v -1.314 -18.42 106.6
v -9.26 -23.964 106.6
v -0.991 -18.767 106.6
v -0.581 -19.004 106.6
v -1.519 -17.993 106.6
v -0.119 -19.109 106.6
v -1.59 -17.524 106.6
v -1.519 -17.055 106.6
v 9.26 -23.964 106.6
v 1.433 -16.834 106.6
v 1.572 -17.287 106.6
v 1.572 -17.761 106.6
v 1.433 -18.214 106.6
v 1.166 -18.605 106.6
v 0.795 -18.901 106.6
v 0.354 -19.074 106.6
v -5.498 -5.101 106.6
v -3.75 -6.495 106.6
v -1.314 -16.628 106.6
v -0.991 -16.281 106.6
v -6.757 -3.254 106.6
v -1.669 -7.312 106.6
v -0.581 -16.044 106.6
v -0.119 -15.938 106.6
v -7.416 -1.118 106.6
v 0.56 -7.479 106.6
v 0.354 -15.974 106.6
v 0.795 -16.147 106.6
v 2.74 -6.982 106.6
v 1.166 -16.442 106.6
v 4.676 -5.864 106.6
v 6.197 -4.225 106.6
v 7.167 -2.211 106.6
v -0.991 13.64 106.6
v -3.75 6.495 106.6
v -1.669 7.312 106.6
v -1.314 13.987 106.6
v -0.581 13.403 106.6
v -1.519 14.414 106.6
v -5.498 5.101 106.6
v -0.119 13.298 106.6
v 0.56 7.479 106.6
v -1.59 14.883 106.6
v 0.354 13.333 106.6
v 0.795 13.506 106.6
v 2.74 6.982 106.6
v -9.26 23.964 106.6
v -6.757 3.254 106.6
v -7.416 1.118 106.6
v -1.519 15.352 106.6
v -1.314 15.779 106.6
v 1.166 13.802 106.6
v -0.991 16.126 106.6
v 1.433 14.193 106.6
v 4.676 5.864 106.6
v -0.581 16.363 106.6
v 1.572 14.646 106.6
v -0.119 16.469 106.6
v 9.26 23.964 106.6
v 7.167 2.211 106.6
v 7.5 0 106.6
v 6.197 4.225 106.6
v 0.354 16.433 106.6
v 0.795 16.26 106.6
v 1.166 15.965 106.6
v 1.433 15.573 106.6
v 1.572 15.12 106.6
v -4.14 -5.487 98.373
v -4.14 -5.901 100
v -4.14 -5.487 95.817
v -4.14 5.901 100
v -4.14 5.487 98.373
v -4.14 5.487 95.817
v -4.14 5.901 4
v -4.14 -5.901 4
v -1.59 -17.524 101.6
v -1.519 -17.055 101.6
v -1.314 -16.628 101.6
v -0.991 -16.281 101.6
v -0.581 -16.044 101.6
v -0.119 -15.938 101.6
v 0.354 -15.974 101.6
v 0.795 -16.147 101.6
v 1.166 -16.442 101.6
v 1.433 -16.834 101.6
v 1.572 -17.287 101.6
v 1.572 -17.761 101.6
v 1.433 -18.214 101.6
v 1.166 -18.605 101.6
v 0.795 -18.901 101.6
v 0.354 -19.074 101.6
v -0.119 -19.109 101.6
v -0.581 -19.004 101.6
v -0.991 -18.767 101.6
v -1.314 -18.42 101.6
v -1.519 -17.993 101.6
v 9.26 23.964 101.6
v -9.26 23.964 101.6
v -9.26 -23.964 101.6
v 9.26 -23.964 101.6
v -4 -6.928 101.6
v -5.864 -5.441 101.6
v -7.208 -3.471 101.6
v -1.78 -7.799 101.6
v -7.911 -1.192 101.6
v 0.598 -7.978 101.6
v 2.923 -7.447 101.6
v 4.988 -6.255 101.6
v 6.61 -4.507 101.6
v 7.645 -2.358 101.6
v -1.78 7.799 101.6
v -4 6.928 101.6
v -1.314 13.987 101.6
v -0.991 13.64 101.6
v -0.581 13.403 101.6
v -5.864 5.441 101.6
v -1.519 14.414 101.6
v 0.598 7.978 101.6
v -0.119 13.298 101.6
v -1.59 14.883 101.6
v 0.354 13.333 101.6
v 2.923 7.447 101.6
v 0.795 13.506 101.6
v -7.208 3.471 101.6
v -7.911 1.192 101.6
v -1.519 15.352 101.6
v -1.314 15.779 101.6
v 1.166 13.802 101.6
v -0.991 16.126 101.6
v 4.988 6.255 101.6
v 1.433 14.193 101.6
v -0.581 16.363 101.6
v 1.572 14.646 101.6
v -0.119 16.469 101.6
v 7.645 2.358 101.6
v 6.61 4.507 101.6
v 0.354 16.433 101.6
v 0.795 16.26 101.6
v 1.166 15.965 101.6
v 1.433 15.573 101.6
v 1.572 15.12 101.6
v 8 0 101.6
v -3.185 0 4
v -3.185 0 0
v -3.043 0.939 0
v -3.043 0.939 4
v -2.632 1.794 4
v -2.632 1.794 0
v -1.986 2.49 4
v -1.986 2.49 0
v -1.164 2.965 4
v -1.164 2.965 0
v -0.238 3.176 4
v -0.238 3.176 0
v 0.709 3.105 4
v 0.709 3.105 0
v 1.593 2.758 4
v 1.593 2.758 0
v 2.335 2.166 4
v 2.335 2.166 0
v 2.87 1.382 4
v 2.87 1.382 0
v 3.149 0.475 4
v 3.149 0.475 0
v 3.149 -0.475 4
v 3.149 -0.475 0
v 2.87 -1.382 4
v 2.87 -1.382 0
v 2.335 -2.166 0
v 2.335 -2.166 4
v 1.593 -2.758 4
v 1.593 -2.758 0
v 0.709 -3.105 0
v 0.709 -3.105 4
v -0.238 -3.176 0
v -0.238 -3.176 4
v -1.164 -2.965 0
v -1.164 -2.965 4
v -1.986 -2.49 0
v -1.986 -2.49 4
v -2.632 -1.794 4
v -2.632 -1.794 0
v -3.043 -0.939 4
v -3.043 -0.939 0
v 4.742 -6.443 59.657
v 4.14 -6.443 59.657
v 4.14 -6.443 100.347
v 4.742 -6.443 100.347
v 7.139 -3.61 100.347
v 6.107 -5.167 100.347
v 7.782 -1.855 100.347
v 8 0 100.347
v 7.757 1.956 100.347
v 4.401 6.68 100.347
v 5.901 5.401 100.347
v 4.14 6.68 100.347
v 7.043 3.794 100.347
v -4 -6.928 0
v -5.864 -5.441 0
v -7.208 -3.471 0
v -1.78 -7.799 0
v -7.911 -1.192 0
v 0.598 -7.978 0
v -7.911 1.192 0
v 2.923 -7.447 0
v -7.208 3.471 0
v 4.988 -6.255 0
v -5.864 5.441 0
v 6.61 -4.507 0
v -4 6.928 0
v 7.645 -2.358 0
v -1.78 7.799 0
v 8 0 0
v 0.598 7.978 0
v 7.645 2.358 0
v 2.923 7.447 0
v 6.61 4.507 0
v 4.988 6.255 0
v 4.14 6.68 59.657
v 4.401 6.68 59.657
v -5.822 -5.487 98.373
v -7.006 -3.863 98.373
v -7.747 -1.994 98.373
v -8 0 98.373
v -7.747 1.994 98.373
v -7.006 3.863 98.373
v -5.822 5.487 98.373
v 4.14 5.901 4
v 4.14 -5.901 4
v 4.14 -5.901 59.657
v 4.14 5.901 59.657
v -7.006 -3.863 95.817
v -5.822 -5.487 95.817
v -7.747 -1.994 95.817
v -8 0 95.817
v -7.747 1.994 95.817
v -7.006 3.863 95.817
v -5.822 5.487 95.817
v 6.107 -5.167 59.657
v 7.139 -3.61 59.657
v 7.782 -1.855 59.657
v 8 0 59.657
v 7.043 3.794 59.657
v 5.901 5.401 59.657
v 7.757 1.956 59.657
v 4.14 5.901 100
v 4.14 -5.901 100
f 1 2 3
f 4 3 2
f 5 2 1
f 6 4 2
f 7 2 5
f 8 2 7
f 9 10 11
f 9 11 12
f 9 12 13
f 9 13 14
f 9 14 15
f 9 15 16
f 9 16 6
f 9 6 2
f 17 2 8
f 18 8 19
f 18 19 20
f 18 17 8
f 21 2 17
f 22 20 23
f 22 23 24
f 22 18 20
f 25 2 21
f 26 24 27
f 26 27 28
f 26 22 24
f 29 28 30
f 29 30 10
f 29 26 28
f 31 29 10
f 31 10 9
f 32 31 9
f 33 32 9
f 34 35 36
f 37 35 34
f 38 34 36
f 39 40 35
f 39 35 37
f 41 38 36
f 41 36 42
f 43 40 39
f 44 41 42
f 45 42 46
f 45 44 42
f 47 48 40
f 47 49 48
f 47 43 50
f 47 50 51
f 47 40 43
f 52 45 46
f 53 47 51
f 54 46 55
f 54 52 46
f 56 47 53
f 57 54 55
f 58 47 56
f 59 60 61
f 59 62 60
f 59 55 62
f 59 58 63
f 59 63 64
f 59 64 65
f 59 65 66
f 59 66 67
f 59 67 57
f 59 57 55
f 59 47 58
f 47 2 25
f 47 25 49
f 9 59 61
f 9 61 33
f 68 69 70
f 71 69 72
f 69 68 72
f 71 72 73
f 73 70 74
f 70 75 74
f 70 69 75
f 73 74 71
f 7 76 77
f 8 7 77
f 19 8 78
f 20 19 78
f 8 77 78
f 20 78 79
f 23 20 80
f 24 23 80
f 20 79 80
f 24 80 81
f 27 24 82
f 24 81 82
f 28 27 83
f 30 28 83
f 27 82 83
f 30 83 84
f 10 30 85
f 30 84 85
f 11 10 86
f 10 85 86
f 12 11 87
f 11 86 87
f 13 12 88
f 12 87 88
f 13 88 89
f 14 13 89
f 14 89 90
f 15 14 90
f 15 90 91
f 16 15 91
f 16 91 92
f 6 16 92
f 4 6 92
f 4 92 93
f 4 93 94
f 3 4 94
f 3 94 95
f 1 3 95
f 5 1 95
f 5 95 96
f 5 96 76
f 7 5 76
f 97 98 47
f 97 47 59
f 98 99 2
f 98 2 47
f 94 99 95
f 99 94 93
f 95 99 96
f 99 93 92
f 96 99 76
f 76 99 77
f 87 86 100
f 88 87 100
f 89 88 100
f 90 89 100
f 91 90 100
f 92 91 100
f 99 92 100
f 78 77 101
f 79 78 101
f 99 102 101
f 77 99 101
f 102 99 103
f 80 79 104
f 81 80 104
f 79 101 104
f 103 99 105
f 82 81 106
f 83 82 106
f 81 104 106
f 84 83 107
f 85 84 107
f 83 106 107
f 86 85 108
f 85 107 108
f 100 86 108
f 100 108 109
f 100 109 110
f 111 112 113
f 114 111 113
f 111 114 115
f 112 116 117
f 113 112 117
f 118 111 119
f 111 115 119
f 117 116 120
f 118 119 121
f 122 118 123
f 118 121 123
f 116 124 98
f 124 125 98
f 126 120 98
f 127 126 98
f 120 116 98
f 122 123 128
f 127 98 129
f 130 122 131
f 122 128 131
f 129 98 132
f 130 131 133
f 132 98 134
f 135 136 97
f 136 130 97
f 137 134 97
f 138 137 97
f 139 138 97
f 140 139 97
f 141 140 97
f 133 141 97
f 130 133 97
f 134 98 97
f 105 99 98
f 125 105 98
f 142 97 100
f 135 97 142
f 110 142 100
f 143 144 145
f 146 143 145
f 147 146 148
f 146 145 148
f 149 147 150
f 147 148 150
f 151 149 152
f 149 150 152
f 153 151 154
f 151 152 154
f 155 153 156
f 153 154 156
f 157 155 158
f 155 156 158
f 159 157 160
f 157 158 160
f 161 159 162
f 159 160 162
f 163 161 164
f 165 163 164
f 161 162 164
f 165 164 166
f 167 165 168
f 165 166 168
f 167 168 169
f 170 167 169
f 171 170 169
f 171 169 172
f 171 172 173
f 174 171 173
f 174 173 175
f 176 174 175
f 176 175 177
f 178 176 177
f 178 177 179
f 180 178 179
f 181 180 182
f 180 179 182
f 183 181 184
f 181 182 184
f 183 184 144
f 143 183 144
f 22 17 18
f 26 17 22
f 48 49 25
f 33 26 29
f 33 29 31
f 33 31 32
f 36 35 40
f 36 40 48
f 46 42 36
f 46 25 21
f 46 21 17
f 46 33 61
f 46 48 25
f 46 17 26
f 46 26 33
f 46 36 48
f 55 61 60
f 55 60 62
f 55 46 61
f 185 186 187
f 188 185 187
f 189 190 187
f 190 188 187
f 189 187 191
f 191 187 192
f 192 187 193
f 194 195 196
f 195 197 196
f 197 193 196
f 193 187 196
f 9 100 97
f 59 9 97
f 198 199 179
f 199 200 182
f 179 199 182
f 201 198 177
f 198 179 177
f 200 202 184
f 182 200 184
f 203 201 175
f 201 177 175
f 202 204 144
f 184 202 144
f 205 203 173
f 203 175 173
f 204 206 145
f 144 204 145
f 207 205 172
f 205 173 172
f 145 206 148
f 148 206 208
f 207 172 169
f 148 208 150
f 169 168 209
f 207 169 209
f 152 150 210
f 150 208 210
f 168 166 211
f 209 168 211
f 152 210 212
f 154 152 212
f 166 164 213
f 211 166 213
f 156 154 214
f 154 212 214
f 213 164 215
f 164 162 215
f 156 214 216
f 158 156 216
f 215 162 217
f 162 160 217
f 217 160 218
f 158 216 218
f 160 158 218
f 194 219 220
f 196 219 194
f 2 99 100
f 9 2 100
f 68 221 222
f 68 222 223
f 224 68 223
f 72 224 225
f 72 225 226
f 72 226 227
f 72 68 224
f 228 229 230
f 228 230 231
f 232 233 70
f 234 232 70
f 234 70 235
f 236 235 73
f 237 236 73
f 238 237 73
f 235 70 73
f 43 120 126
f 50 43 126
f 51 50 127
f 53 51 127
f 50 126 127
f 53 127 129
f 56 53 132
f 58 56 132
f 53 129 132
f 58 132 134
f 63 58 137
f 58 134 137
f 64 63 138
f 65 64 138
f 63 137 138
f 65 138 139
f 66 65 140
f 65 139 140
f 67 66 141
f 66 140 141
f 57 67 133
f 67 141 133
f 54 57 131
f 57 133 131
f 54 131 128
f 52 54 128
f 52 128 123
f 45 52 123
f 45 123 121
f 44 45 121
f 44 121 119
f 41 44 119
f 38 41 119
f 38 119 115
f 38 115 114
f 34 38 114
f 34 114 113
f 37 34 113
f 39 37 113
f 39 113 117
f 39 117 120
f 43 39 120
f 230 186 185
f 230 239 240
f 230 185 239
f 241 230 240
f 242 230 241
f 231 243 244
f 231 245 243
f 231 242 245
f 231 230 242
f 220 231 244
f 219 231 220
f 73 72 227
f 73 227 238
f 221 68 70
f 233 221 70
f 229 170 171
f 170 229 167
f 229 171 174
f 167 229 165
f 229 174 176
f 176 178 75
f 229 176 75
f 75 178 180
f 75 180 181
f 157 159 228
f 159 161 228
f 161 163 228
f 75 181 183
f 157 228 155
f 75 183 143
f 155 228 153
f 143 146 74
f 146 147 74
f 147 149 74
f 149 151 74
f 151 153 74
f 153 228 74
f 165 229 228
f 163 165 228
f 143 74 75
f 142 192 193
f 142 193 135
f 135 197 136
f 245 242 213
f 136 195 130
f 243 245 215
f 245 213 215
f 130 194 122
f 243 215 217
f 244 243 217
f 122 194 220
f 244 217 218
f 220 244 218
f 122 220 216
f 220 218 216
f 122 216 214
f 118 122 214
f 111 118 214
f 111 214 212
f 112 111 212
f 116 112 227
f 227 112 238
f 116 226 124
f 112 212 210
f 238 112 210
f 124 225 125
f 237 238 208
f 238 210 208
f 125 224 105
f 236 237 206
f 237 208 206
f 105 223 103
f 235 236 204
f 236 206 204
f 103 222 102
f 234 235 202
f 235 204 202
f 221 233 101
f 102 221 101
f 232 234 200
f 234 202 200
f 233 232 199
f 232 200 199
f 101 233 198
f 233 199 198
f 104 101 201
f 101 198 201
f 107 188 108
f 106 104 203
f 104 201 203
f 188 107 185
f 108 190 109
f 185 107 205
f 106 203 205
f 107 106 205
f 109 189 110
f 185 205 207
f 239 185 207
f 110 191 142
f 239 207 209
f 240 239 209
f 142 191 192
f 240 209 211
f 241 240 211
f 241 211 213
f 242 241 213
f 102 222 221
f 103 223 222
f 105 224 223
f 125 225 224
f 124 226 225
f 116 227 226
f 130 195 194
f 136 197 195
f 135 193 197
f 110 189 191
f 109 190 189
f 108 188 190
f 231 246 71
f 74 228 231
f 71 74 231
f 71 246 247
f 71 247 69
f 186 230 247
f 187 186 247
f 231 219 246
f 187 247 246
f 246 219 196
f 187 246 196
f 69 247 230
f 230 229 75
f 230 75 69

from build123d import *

# Parameters (mm, degrees)
SKETCH1_R           = 8
BOSS_EXTRUDE1_DEPTH = 101.6
SKETCH2_W           = 18.519646932
SKETCH2_H           = 47.927417474
BOSS_EXTRUDE2_DEPTH = 5
SKETCH3_R           = 7.5
BOSS_EXTRUDE3_DEPTH = 0.0001
SKETCH4_R           = 1.59
CUT_EXTRUDE1_DEPTH  = 34
SKETCH7_R           = 3.185
CUT_EXTRUDE2_DEPTH  = 4
SKETCH8_W           = 8.28003219
SKETCH8_H           = 11.80237286
CUT_EXTRUDE7_DEPTH  = 96
SKETCH12_W          = 40.69032966
SKETCH12_H          = 13.123197876
CUT_EXTRUDE8_DEPTH  = 35
SKETCH13_W          = 2.556138798
SKETCH13_H          = 10.974311436
CUT_EXTRUDE9_DEPTH  = 35


with BuildPart() as part:
    # Sketch1 → Boss-Extrude1 (new body)
    with BuildSketch(Plane.XY):
        Circle(SKETCH1_R)
    extrude(amount=BOSS_EXTRUDE1_DEPTH)

    # Sketch2 → Boss-Extrude2 (add)
    with BuildSketch(Plane.XY.offset(101.6)):
        Rectangle(SKETCH2_W, SKETCH2_H)
    extrude(amount=BOSS_EXTRUDE2_DEPTH)

    # Sketch3 → Boss-Extrude3 (add)
    with BuildSketch(Plane.XY.offset(106.6)):
        Circle(SKETCH3_R)
    extrude(amount=BOSS_EXTRUDE3_DEPTH)

    # Sketch4 → Cut-Extrude1 (cut)
    with BuildSketch(Plane(origin=(0, 0, 101.6), x_dir=(-1, 0, 0), z_dir=(0, 0, -1))):
        with Locations((0, 14.883091948)):
            Circle(SKETCH4_R)
        with Locations((0, -17.523878239)):
            Circle(SKETCH4_R)
    extrude(amount=-CUT_EXTRUDE1_DEPTH, mode=Mode.SUBTRACT)

    # Sketch7 → Cut-Extrude2 (cut)
    with BuildSketch(Plane(origin=(0, 0, 0), x_dir=(-1, 0, 0), z_dir=(0, 0, -1))):
        Circle(SKETCH7_R)
    extrude(amount=-CUT_EXTRUDE2_DEPTH, mode=Mode.SUBTRACT)

    # Sketch8 → Cut-Extrude7 (cut)
    with BuildSketch(Plane(origin=(0, 0, 4), x_dir=(-1, 0, 0), z_dir=(0, 0, -1))):
        Rectangle(SKETCH8_W, SKETCH8_H)
    extrude(amount=-CUT_EXTRUDE7_DEPTH, mode=Mode.SUBTRACT)

    # Sketch12 → Cut-Extrude8 (cut)
    with BuildSketch(Plane.ZY.offset(-4.140016095)):
        with Locations((80.002136868, 0.118820051)):
            Rectangle(SKETCH12_W, SKETCH12_H)
    extrude(amount=-CUT_EXTRUDE8_DEPTH, mode=Mode.SUBTRACT)

    # Sketch13 → Cut-Extrude9 (cut)
    with BuildSketch(Plane(origin=(-4.140016095, 0, 0), x_dir=(0, 0, -1), z_dir=(1, 0, 0))):
        with Locations((-97.09530972, 0)):
            Rectangle(SKETCH13_W, SKETCH13_H)
    extrude(amount=-CUT_EXTRUDE9_DEPTH, mode=Mode.SUBTRACT)


solid = part.part
